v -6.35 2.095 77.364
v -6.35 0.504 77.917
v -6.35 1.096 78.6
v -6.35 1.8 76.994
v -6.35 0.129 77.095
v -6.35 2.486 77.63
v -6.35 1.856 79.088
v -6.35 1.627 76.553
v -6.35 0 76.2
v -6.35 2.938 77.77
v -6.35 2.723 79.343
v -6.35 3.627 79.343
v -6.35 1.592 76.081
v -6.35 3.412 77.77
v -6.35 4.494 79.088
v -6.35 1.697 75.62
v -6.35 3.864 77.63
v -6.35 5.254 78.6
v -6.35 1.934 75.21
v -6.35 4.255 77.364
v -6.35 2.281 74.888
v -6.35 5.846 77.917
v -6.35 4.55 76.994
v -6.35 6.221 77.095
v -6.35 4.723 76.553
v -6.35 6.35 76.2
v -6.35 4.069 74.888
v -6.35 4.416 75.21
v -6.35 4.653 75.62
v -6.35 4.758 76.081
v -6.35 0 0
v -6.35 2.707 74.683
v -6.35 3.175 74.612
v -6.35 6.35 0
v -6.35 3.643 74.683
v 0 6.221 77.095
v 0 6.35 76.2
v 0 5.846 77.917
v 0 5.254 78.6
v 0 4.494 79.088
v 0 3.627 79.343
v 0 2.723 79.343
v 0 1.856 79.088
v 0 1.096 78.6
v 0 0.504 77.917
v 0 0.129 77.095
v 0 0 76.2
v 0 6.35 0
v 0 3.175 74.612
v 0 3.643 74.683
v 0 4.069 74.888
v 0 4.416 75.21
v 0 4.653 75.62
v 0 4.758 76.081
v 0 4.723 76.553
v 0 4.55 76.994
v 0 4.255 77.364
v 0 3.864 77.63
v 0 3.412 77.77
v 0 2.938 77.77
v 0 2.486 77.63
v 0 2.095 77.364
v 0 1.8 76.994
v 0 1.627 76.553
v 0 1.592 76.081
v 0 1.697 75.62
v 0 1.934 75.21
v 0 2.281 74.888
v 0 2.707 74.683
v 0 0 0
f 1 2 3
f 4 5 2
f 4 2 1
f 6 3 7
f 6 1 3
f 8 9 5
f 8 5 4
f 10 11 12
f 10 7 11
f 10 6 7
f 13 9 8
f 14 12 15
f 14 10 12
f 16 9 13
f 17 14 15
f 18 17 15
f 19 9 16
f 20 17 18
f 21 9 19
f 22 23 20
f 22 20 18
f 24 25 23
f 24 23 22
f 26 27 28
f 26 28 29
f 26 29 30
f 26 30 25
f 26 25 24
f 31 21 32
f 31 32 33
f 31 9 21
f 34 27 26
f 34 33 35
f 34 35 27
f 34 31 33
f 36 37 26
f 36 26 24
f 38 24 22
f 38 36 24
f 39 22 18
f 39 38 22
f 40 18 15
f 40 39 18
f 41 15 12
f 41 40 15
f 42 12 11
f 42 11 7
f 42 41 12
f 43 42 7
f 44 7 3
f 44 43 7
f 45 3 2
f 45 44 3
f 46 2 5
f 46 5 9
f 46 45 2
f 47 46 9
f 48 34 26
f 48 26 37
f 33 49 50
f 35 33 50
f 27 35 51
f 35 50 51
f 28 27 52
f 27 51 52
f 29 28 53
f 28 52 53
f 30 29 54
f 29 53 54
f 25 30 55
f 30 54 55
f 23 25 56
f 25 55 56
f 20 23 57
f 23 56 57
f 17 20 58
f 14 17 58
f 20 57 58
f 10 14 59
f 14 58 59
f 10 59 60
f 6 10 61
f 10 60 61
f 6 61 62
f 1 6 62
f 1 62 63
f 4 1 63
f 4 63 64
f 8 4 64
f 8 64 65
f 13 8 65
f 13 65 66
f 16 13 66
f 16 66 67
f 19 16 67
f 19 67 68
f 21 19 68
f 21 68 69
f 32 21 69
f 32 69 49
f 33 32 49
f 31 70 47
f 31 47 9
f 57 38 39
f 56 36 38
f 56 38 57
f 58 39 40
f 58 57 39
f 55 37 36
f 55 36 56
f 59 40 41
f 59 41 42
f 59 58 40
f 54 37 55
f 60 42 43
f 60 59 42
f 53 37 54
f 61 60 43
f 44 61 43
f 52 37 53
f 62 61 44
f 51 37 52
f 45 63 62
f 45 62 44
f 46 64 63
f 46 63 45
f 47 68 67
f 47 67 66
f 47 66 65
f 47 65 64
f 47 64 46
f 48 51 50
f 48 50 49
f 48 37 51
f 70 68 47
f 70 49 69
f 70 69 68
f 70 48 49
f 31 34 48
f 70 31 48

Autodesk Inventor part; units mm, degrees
ref_plane "YZ Plane" through (0, 0, 0) normal (1, 0, 0) x (0, 1, 0)
ref_plane "XZ Plane" through (0, 0, 0) normal (0, 1, 0) x (-1, 0, 0)
ref_plane "XY Plane" through (0, 0, 0) normal (0, 0, 1) x (1, 0, 0)
sketch "Sketch1" plane through (0, 0, 0) normal (0, 0, 1) x (1, 0, 0)
  line L0 (0, 0) -> (-6.35, 0)
  line L1 (-6.35, 0) -> (-6.35, 6.35)
  line L2 (-6.35, 6.35) -> (0, 6.35)
  line L3 (0, 6.35) -> (0, 0)
  dimension "d0" = 6.35
  dimension "d1" = 6.35
extrude "Extrusion1" add sketch "Sketch1" along normal blind 76.2
sketch "Sketch2" plane through (0, 0, 0) normal (1, 0, 0) x (0, 0, -1)
  line L0 (-76.2, 0) -> (-76.2, 6.35) projected
  arc A0 (-76.2, 6.35) -> (-76.2, 0) centre (-76.2, 3.175) ccw
  circle A1 centre (-76.2, 3.175) radius 1.5875
  point P0 (0, 0)
  dimension "d4" = 3.175
  dimension "d5" = 3.175
extrude "Extrusion2" add sketch "Sketch2" against normal blind 6.35 contours A0 L0 A1 | A1 L0 picked at (-76.3266, 2.6612)
extrude "Extrusion3" cut sketch "Sketch2" against normal blind 6.35 contours A1 L0 | L0 A1
